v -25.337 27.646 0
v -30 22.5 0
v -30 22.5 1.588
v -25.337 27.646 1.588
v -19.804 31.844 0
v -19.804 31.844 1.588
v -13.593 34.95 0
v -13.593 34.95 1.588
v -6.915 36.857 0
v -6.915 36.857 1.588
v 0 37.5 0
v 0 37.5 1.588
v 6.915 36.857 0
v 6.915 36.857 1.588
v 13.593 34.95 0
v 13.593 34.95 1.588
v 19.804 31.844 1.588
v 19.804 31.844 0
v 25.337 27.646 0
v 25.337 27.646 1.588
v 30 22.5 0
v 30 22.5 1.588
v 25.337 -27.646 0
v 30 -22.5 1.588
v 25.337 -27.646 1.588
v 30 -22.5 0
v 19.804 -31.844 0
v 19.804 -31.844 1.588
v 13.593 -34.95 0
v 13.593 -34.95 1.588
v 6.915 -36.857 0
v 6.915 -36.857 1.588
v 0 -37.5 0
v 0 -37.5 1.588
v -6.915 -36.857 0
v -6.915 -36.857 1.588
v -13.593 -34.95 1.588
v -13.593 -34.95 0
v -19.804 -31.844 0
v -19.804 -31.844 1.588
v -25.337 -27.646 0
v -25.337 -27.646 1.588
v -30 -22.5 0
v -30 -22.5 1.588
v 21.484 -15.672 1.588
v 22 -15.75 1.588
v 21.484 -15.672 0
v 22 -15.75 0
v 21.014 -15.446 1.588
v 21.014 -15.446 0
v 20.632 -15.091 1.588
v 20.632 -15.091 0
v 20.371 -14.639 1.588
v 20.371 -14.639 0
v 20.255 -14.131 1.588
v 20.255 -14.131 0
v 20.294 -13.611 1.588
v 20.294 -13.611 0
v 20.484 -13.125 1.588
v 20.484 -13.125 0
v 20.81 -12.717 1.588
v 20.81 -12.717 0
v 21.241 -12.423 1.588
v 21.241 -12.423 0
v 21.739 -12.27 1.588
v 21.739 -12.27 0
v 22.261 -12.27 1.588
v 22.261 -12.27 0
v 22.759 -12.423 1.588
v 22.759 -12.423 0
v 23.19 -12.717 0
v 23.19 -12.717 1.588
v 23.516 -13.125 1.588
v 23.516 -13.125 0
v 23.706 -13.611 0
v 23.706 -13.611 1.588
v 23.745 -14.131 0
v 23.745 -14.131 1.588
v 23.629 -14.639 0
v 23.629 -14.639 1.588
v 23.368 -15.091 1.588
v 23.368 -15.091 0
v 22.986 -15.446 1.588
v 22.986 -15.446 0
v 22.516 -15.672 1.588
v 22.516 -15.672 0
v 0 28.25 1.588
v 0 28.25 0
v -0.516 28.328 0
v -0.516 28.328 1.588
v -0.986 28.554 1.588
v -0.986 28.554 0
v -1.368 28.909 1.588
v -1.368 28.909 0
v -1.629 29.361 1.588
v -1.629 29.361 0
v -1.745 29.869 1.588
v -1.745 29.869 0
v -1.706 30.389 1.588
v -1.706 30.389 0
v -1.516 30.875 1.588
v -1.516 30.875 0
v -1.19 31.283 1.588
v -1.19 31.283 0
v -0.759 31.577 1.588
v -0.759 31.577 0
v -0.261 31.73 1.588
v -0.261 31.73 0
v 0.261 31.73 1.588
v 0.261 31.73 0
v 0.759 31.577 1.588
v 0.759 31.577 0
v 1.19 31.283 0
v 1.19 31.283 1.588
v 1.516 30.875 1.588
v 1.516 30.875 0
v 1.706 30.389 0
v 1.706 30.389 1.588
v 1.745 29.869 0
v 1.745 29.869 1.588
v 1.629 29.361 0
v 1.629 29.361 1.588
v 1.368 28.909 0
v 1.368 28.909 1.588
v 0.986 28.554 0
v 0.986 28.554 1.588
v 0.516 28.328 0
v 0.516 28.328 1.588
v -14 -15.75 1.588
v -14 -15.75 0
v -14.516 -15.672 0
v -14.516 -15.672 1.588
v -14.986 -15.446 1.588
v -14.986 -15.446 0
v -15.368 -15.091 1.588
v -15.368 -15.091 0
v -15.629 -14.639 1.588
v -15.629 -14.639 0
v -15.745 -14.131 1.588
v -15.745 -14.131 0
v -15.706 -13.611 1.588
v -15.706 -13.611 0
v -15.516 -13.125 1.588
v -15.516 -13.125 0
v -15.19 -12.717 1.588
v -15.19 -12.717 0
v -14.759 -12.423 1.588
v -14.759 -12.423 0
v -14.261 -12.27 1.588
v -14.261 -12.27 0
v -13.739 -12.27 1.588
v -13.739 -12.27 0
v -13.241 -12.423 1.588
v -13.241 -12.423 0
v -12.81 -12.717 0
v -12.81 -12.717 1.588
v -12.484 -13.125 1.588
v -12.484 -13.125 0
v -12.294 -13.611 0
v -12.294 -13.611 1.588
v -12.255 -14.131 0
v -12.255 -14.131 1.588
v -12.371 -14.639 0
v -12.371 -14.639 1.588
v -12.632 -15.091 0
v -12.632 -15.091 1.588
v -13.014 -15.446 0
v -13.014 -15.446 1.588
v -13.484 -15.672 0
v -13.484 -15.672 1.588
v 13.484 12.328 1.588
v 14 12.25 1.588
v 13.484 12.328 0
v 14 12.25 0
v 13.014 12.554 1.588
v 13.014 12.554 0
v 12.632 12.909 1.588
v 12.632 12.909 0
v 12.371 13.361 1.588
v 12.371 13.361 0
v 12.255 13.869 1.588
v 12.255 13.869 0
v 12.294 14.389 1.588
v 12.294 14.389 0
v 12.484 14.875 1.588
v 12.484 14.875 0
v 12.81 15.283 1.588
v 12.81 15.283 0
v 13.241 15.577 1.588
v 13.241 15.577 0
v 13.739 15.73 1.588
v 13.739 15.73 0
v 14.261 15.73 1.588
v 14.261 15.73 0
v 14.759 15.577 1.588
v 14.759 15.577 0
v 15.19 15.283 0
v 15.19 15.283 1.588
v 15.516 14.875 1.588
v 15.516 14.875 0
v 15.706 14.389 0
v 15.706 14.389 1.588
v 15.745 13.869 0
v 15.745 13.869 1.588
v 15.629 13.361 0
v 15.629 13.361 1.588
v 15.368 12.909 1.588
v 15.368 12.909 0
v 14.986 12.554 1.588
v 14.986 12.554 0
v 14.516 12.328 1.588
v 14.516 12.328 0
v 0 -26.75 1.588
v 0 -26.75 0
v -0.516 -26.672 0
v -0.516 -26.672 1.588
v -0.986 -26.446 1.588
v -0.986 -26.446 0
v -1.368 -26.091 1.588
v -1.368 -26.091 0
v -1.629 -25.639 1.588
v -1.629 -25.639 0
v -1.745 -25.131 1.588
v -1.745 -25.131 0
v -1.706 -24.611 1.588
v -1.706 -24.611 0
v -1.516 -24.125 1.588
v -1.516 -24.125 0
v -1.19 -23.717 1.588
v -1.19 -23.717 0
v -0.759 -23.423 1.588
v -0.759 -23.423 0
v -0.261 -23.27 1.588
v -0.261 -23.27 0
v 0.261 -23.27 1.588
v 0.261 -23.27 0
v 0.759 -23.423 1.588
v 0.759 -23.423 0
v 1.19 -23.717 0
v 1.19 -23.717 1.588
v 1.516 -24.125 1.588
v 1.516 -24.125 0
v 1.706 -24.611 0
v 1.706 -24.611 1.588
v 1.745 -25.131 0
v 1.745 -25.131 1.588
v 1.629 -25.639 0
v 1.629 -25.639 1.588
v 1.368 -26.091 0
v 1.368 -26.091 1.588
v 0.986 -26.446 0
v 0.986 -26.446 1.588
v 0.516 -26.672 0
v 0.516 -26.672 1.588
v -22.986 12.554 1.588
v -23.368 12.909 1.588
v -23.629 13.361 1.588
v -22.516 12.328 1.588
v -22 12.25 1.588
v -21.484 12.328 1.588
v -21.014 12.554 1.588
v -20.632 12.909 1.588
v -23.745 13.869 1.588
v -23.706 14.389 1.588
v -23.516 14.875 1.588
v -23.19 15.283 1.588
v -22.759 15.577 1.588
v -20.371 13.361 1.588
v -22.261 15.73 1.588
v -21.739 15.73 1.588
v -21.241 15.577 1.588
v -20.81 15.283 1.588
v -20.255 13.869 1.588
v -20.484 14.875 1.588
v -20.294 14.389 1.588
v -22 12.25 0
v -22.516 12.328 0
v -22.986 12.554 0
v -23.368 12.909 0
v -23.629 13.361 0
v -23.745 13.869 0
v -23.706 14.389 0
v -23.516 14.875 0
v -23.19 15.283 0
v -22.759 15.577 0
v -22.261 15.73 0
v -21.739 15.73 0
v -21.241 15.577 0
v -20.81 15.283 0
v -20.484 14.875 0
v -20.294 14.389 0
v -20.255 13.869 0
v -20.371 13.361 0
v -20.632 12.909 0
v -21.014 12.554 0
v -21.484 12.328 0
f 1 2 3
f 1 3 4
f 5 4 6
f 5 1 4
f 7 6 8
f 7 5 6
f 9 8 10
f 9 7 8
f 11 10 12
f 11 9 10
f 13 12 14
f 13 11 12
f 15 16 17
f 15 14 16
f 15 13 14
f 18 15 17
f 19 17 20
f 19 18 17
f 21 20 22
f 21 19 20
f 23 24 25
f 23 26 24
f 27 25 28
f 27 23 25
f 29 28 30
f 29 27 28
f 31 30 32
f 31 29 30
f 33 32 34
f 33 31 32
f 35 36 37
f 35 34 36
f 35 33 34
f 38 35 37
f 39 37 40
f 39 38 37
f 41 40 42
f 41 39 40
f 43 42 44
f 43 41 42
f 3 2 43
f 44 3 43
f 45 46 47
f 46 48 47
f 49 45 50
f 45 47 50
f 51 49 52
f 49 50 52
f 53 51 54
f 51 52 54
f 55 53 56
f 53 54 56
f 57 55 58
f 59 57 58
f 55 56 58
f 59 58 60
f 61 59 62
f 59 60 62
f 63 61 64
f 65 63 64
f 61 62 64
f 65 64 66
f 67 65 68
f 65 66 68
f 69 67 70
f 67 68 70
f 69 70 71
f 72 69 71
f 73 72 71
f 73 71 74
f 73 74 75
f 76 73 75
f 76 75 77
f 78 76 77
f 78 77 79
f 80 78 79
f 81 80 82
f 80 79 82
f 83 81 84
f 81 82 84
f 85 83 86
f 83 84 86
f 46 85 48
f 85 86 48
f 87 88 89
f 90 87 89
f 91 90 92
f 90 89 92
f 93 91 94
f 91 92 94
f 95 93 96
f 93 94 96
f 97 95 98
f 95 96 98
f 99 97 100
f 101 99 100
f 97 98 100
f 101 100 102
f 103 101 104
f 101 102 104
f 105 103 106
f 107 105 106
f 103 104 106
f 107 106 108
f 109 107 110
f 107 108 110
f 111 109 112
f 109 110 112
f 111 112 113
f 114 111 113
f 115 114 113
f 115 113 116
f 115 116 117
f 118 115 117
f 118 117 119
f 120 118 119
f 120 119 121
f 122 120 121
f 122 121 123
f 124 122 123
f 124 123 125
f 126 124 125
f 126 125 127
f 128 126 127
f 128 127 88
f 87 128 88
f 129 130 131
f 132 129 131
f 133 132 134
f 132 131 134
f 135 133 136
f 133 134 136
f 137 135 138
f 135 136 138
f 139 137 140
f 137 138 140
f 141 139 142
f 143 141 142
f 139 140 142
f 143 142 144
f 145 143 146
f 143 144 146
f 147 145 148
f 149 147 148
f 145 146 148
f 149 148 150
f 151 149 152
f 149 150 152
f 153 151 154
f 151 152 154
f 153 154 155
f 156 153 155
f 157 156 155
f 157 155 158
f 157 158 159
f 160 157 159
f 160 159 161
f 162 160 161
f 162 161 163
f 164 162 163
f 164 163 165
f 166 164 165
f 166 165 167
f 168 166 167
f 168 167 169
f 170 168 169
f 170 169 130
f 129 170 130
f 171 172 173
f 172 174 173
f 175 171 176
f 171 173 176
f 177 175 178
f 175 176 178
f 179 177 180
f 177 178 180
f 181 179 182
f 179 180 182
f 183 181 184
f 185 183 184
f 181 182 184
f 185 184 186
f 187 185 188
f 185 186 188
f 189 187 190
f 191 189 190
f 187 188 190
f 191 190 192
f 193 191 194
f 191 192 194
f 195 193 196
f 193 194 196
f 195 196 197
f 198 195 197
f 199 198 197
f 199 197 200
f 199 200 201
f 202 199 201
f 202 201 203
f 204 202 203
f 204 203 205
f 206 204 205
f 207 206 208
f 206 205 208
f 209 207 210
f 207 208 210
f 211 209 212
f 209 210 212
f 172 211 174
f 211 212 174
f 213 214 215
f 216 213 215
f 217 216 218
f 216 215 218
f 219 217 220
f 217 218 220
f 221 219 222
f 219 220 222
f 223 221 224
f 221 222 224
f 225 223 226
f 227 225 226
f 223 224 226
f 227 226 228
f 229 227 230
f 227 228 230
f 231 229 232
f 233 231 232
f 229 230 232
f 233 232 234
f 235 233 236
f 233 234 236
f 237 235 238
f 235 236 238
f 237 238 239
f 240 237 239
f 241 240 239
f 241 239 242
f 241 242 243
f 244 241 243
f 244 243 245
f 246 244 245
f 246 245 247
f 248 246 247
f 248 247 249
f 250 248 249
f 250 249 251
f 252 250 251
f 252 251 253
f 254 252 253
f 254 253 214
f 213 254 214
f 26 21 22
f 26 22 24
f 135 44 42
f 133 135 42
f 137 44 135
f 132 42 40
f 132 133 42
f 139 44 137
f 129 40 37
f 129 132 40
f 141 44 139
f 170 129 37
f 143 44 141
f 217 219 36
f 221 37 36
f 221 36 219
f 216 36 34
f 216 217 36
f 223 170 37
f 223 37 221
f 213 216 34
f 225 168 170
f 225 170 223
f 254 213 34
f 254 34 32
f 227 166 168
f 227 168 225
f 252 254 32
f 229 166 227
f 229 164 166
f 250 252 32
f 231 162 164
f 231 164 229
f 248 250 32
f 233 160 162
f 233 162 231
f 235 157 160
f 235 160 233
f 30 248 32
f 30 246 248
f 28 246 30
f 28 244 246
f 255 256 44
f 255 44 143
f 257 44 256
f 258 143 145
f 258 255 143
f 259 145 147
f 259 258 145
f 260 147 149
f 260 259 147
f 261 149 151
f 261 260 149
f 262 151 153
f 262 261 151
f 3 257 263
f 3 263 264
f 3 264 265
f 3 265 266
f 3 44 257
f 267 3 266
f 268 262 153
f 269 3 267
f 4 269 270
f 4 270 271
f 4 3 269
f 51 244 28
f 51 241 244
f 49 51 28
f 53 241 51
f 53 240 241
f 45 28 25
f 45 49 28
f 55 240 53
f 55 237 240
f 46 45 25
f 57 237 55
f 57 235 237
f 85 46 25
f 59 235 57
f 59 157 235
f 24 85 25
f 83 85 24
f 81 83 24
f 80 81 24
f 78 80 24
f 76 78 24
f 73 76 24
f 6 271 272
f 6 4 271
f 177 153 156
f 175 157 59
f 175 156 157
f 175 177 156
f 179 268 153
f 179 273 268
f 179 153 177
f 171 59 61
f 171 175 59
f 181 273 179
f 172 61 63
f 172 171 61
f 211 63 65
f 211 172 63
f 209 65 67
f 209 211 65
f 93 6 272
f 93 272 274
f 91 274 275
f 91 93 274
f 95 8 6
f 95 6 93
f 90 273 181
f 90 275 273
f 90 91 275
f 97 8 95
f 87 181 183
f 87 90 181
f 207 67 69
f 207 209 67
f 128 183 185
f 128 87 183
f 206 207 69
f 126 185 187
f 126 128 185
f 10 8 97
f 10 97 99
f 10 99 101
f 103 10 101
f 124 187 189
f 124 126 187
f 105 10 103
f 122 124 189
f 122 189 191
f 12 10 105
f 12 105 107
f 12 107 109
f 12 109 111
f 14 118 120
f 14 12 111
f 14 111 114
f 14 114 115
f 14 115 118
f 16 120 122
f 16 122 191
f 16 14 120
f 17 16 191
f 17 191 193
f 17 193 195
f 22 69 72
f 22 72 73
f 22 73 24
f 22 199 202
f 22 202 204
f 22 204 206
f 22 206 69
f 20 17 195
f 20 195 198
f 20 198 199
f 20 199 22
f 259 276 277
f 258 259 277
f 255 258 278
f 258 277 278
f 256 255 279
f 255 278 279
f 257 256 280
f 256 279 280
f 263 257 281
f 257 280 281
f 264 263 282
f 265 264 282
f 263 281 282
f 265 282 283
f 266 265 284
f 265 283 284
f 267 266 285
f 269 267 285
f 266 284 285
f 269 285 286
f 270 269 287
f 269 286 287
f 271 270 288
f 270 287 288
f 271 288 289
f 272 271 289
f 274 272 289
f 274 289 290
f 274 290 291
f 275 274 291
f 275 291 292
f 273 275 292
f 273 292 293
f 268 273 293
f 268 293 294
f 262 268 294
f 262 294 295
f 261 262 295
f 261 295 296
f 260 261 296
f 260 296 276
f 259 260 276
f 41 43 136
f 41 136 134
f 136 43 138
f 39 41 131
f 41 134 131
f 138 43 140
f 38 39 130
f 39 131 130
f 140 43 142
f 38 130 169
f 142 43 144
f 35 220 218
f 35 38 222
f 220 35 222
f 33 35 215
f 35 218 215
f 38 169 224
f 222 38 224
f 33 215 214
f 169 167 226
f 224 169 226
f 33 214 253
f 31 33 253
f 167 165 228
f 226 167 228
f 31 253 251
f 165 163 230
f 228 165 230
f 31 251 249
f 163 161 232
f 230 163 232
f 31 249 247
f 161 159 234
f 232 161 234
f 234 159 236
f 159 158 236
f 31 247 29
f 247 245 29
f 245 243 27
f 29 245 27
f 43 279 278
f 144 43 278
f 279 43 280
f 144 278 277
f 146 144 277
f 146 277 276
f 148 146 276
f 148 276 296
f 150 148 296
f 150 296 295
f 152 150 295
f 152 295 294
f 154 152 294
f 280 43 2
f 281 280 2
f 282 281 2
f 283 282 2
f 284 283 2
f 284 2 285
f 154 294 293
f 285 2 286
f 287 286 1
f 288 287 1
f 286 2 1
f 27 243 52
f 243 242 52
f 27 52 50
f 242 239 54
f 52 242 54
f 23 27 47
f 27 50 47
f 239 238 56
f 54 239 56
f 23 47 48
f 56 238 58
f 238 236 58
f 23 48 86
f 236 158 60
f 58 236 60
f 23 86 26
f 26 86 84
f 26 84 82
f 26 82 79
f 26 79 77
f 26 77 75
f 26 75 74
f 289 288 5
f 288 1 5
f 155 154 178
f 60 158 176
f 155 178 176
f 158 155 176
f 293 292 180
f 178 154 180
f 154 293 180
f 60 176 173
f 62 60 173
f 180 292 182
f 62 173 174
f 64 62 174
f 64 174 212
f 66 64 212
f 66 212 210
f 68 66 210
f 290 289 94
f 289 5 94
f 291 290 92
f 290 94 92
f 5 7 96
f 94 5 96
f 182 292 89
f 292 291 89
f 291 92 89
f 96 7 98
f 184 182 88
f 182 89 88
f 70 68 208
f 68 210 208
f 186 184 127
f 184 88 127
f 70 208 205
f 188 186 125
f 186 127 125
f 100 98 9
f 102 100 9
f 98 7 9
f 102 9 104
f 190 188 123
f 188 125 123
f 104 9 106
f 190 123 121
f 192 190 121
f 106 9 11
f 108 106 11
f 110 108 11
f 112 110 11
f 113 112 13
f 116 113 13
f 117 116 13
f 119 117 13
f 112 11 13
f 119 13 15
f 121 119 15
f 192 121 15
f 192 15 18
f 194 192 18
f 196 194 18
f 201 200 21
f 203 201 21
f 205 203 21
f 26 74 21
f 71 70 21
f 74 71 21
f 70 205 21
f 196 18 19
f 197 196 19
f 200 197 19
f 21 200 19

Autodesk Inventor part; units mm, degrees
ref_plane "YZ Plane" through (0, 0, 0) normal (1, 0, 0) x (0, 1, 0)
ref_plane "XZ Plane" through (0, 0, 0) normal (0, 1, 0) x (-1, 0, 0)
ref_plane "XY Plane" through (0, 0, 0) normal (0, 0, 1) x (1, 0, 0)
sketch "Sketch1" plane through (0, 0, 0) normal (0, 0, 1) x (1, 0, 0)
  circle A0 centre (0, 0) radius 37.5
  line L0 (-30, 22.5) -> (-30, -22.5)
  line L1 (30, 22.5) -> (30, -22.5)
  dimension "d0" = 75
  dimension "d20" = 45
extrude "Extrusion1" add sketch "Sketch1" along normal blind 1.5875 contours L1 A0 L0
sketch "Sketch2" plane through (0, 0, 1.5875) normal (0, 0, 1) x (1, 0, 0)
  circle A0 centre (-14, -14) radius 1.75
  line L0 (30, -22.5) -> (30, 22.5) projected
  line L1 (-30, 22.5) -> (-30, -22.5) projected
  point P0 (0, 0)
  point P1 (22, -14)
  point P2 (14, 14)
  point P3 (-22, 14)
  point P4 (0, -25)
  point P5 (0, 30)
  dimension "d11" = 8
  dimension "d15" = 16
  dimension "d21" = 16
  dimension "d24" = 8
  dimension "d26" = 28
  dimension "d27" = 28
  dimension "d28" = 14
  dimension "d29" = 14
  dimension "d30" = 25
  dimension "d31" = 30
hole "Hole1" at (22, -14, 1.5875) at (14, 14, 1.5875) at (-14, -14, 1.5875) at (-22, 14, 1.5875) at (0, -25, 1.5875) at (0, 30, 1.5875) direction (0, 0, -1) diameter 3.5 end through all
equation "\"d15\" = d21"
equation "\"d24\" = d11"
equation "\"d27\" = d26"
equation "\"d28\" = 0.5 * d27"
equation "\"d29\" = 0.5 * d26"
properties part number "PCB_PLACEHOLDER"
